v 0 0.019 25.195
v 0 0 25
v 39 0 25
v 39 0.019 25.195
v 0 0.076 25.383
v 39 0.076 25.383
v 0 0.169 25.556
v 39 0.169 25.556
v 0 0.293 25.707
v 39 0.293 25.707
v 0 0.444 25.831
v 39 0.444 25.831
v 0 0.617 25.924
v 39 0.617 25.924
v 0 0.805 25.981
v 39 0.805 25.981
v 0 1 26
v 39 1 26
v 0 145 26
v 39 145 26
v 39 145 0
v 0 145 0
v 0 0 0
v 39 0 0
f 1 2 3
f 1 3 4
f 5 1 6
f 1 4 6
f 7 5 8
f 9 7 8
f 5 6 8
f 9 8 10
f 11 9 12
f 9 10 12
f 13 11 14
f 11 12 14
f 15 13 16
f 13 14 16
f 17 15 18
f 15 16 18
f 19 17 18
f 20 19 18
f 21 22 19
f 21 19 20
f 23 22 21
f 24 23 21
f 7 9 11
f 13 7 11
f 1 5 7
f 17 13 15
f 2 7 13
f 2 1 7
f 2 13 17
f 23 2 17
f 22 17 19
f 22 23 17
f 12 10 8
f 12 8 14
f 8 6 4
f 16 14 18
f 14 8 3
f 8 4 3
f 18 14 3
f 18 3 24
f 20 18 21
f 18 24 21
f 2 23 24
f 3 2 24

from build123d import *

# Parameters (mm, degrees)
BOX_W     = 39
BOX_H     = 145
BOX_DEPTH = 26
FILLET_R  = 1


with BuildPart() as part:
    # Box → Box (new body)
    with BuildSketch(Plane.XY):
        with Locations((19.5, 72.5)):
            Rectangle(BOX_W, BOX_H)
    extrude(amount=BOX_DEPTH)

    # Fillet
    fillet_edges = [part.edges().sort_by_distance(p)[0] for p in [
        (19.5, 0, 26),
    ]]
    fillet(fillet_edges, radius=FILLET_R)


solid = part.part
